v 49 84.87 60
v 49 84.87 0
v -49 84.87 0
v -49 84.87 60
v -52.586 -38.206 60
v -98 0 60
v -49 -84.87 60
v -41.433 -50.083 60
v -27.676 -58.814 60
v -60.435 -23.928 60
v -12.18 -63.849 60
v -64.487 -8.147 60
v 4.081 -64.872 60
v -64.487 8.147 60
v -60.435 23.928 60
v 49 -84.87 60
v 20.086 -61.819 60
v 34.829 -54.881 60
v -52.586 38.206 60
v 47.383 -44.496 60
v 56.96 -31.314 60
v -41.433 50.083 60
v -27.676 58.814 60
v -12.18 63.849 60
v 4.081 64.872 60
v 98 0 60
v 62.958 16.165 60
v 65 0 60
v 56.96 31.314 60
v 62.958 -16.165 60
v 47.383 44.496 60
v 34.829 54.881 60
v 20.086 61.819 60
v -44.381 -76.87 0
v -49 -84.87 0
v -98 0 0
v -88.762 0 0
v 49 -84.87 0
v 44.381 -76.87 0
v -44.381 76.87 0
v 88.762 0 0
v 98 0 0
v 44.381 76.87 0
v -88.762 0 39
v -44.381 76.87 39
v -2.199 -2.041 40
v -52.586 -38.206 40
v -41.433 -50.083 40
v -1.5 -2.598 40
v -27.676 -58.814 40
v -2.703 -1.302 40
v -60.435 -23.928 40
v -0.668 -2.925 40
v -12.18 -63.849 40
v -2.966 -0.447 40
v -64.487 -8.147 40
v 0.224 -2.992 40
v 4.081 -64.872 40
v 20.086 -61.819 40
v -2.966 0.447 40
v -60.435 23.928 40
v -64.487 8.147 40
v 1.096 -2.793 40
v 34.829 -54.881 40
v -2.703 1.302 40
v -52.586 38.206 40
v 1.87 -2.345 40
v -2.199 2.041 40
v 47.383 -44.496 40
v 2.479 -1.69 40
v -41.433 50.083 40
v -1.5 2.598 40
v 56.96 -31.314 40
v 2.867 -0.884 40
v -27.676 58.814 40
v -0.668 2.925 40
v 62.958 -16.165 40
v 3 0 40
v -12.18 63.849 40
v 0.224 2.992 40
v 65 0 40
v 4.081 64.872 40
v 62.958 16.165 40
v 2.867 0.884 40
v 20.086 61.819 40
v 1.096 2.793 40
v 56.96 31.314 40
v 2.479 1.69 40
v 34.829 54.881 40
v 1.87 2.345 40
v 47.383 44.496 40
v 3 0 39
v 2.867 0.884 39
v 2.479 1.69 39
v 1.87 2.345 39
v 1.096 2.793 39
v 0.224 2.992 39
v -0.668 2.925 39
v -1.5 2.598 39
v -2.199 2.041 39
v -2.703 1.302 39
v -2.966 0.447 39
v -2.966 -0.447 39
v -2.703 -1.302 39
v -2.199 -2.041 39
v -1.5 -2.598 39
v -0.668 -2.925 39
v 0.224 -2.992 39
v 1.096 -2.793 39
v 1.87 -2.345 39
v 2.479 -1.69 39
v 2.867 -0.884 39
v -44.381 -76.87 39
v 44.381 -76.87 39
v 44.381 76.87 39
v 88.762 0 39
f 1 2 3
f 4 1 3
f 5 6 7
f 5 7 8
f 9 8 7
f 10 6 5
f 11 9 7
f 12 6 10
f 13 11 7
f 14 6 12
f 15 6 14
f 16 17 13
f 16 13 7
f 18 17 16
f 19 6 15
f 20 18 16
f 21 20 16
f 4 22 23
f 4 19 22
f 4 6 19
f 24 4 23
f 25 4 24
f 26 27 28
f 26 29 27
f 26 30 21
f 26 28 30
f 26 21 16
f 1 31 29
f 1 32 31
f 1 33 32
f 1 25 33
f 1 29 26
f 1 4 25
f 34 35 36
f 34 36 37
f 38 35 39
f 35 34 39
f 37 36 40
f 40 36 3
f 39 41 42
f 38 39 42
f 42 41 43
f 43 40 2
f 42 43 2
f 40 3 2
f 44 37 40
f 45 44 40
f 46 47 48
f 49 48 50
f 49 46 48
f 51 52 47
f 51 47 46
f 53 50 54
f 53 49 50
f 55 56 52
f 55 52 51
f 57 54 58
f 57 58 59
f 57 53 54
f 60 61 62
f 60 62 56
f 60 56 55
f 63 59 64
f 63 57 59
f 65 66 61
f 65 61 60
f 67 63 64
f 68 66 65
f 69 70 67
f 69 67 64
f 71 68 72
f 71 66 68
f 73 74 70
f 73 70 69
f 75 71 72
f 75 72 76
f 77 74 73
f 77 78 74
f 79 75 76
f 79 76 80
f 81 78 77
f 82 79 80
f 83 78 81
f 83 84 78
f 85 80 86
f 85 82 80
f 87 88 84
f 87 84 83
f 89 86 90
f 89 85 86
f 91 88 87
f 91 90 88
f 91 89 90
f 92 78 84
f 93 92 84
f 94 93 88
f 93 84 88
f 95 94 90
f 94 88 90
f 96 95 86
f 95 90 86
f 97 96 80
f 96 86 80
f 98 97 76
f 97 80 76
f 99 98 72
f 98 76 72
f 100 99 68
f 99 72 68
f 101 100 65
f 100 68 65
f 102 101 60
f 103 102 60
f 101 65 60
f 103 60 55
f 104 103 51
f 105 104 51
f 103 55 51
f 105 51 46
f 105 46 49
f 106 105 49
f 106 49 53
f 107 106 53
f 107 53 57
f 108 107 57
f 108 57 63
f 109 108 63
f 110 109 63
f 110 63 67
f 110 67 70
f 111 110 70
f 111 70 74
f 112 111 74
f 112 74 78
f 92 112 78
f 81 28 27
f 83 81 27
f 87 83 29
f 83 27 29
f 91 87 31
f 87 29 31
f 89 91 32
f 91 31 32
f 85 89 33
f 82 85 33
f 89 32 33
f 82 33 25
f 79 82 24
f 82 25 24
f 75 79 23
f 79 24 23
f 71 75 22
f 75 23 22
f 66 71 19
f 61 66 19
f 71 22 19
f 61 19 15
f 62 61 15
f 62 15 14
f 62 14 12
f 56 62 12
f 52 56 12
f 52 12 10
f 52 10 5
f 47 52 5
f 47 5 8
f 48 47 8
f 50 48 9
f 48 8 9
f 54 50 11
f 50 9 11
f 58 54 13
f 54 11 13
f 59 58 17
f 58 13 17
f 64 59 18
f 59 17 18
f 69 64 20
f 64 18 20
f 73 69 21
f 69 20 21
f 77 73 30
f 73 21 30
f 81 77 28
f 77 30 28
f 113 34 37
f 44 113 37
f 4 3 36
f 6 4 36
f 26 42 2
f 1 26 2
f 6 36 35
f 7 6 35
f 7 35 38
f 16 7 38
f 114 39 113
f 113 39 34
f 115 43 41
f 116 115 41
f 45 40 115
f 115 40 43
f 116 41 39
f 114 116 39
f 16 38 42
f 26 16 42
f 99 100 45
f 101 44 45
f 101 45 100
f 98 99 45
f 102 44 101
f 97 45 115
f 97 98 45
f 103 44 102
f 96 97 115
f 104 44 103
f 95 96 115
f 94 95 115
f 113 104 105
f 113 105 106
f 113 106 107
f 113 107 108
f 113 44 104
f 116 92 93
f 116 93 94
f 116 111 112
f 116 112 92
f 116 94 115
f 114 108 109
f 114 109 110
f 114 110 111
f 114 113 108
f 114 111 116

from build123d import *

# Parameters (mm, degrees)
PAD001_DEPTH    = 60
SKETCH003_R     = 65
POCKET001_DEPTH = 20
POCKET003_DEPTH = 39
SKETCH015_R     = 3
POCKET004_DEPTH = 40.001


with BuildPart() as part:
    # Sketch002 → Pad001 (new body)
    with BuildSketch(Plane.XY):
        Polygon((49, 84.87049), (-49, 84.87049), (-98, 0), (-49, -84.87049), (49, -84.87049), (98, 0), align=None)
    extrude(amount=PAD001_DEPTH)

    # Sketch003 (on Face8 of Pad001) → Pocket001 (cut)
    with BuildSketch(Plane.XY.offset(60)):
        Circle(SKETCH003_R)
    extrude(amount=-POCKET001_DEPTH, mode=Mode.SUBTRACT)

    # Sketch014 (on Face4 of Pocket001) → Pocket003 (cut)
    with BuildSketch(Plane(origin=(0, 0, 0), x_dir=(1, 0, 0), z_dir=(0, 0, -1))):
        Polygon((44.381198, 76.87049), (-44.381198, 76.87049), (-88.762396, 0), (-44.381198, -76.87049), (44.381198, -76.87049), (88.762396, 0), align=None)
    extrude(amount=-POCKET003_DEPTH, mode=Mode.SUBTRACT)

    # Sketch015 (on Face17 of Pocket003) → Pocket004 (cut, through all)
    with BuildSketch(Plane.XY.offset(40)):
        Circle(SKETCH015_R)
    extrude(amount=-POCKET004_DEPTH, mode=Mode.SUBTRACT)


solid = part.part
